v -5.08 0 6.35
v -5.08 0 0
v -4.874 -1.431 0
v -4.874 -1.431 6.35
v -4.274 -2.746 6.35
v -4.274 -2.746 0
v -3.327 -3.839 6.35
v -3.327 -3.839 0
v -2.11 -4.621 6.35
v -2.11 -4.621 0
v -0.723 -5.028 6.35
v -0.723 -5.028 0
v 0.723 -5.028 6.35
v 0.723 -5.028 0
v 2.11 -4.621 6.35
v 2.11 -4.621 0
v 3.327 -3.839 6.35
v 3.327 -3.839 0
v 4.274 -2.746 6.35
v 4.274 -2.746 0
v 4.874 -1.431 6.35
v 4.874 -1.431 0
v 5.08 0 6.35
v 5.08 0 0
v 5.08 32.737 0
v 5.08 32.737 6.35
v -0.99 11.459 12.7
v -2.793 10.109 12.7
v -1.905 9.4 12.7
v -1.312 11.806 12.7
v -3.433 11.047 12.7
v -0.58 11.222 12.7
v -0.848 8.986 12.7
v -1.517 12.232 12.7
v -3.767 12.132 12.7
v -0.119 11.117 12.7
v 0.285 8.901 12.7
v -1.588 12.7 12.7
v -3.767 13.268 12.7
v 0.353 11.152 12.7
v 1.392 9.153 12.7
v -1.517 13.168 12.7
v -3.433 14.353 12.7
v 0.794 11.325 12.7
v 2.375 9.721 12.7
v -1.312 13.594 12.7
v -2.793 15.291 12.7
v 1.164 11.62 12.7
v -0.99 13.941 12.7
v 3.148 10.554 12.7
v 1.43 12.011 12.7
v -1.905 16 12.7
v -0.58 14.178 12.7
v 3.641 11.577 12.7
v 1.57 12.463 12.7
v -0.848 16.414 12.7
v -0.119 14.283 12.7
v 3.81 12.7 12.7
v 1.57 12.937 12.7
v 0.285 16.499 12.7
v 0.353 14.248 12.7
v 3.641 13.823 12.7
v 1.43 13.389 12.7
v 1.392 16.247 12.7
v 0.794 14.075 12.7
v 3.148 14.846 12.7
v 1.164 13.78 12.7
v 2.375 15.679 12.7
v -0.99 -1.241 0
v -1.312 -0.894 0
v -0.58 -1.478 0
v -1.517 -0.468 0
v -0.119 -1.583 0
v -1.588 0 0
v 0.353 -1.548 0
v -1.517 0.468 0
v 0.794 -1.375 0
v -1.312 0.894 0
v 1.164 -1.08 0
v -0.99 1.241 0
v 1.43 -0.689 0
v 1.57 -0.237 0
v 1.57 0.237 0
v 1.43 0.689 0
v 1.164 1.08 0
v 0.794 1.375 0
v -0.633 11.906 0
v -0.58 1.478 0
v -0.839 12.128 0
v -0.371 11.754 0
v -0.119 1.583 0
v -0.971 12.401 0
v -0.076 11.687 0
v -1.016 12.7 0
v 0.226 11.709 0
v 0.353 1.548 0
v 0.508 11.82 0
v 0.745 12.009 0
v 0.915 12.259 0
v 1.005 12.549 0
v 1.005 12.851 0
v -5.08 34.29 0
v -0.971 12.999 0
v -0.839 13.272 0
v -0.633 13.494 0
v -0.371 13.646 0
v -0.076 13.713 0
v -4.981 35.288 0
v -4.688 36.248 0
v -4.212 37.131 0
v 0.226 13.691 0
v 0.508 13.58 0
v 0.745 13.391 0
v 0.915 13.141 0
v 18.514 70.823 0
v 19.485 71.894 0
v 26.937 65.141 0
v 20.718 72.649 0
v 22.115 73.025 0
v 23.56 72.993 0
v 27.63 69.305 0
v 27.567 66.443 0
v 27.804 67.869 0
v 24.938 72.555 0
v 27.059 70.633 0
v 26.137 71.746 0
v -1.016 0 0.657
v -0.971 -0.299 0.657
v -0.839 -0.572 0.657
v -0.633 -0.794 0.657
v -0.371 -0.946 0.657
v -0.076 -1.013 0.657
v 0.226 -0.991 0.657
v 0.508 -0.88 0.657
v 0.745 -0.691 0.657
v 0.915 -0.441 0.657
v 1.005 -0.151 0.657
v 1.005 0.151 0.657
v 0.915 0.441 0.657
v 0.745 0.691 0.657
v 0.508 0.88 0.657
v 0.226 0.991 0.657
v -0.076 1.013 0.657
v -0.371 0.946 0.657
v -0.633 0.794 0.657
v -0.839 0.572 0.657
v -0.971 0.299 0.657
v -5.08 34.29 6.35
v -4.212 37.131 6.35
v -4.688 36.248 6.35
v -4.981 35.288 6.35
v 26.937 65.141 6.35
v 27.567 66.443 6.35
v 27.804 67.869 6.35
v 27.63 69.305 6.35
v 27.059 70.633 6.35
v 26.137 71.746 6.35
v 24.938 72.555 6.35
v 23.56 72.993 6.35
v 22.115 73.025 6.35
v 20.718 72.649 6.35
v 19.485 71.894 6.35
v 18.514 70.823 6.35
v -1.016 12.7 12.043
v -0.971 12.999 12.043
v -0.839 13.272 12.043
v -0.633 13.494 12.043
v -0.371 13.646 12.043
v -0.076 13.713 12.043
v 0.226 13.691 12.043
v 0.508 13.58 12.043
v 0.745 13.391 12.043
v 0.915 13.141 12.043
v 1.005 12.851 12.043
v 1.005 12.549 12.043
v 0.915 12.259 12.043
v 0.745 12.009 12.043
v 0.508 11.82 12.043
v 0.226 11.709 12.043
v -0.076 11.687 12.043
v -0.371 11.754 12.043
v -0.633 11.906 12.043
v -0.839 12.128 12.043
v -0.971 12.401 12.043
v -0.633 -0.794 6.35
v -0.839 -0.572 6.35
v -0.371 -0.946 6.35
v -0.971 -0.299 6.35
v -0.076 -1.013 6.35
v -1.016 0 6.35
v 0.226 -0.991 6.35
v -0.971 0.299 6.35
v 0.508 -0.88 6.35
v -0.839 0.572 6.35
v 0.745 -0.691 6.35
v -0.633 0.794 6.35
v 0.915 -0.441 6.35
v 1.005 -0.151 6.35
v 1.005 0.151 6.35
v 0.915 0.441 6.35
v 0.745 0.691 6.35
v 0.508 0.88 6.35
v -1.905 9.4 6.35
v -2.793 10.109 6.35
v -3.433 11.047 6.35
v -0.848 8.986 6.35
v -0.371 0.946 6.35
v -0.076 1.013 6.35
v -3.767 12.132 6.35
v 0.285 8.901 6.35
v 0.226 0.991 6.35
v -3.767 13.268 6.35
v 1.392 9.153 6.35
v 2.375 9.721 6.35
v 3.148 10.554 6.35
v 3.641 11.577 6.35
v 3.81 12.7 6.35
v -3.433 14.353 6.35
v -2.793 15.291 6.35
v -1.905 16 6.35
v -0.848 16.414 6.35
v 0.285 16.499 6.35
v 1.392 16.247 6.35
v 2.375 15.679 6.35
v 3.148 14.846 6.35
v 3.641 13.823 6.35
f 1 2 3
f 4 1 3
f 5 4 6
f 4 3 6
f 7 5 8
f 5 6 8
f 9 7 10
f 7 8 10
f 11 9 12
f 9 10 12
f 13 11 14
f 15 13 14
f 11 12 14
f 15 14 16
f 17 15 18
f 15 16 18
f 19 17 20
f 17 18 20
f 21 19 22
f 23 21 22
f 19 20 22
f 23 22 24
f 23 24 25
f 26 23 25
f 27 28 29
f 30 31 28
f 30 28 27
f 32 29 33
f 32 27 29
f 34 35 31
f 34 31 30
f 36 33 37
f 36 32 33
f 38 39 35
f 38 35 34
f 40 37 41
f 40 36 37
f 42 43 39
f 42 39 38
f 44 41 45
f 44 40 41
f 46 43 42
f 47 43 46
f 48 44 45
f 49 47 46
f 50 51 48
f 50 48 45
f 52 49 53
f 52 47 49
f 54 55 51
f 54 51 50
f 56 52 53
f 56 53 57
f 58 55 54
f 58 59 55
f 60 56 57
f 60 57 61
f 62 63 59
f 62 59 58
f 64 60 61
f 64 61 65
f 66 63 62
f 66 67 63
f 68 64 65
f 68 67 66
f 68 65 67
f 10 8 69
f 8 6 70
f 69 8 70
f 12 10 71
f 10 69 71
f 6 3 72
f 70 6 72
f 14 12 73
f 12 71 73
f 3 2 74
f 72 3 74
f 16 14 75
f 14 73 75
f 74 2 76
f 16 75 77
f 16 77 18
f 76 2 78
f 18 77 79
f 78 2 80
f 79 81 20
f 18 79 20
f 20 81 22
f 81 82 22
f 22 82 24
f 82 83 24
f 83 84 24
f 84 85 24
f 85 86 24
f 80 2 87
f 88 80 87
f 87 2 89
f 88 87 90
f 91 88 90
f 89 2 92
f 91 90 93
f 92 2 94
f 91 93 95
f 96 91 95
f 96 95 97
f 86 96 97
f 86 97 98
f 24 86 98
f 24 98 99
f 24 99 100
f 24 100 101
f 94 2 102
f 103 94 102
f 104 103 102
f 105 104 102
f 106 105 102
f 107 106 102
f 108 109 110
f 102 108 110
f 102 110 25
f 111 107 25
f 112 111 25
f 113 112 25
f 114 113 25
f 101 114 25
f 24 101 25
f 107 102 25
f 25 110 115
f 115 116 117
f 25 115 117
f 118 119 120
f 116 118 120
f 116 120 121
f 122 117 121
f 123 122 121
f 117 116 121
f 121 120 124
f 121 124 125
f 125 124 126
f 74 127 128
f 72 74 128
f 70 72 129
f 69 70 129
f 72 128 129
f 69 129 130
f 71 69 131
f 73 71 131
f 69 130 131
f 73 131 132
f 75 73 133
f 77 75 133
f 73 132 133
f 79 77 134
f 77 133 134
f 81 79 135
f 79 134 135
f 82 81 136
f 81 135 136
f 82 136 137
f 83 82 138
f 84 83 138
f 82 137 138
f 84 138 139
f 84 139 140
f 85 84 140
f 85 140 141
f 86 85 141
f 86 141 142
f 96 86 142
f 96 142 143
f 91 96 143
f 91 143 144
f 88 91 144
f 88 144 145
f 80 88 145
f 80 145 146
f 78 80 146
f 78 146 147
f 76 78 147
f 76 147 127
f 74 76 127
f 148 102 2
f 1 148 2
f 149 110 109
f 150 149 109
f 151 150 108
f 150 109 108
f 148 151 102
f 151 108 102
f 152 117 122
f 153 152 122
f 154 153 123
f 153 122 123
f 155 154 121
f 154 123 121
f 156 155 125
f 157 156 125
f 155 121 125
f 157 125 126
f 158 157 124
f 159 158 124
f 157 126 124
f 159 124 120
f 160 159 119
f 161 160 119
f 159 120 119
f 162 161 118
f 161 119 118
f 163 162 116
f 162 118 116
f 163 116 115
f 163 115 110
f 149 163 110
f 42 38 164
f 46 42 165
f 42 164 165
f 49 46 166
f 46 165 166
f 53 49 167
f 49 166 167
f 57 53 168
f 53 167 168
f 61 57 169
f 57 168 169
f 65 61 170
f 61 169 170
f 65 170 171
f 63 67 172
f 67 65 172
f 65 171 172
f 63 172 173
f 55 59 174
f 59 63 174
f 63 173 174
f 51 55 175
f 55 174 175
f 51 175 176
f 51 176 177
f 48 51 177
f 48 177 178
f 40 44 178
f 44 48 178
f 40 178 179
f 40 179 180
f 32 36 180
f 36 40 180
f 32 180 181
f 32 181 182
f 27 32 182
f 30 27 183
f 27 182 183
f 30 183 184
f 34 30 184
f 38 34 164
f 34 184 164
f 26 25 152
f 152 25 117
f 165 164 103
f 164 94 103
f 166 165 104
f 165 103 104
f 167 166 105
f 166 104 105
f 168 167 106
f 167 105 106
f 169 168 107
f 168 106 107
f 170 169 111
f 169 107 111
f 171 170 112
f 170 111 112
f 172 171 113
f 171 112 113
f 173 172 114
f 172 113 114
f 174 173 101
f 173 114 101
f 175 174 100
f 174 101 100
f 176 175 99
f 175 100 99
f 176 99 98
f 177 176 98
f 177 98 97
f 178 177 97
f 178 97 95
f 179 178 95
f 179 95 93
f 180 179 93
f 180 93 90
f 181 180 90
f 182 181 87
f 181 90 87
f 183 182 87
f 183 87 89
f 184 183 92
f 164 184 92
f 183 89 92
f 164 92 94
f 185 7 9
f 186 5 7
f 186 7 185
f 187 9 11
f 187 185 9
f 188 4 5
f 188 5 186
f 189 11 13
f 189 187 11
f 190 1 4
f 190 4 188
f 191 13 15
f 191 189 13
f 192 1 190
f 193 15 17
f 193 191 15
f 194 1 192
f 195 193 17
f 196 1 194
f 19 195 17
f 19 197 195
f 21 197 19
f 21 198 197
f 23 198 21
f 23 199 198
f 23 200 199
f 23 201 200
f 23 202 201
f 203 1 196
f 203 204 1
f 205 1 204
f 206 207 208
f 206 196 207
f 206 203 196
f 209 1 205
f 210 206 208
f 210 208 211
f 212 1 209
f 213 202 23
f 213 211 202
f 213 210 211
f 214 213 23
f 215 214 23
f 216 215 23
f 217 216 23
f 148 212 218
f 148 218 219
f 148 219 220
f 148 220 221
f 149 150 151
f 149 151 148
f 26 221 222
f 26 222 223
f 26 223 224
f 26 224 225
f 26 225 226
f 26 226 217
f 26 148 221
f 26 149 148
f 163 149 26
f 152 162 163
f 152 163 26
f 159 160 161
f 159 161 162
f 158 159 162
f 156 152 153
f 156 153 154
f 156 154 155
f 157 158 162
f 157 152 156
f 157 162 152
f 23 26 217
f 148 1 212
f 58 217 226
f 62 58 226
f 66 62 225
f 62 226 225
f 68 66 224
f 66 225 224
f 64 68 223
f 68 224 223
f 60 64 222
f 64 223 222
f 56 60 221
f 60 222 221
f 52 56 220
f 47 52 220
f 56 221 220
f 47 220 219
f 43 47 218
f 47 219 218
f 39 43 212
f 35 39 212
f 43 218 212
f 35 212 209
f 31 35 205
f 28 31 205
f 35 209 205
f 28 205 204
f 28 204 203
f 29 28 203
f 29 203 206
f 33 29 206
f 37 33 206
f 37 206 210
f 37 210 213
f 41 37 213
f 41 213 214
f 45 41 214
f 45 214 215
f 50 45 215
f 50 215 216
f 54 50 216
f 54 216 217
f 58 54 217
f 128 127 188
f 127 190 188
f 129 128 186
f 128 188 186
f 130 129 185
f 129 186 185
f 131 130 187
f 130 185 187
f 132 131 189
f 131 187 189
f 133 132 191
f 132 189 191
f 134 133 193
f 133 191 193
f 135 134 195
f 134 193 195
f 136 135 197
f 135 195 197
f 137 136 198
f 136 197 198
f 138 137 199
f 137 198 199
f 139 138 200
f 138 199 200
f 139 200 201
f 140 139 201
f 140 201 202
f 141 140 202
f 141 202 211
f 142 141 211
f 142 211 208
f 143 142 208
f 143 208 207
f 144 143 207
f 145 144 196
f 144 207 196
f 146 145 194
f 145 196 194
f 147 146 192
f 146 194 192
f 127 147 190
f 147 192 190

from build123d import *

# Parameters (mm, degrees)
F1_DEPTH       = 6.35
F2_R           = 3.81
F3_DEPTH       = 12.7
F5_D           = 2.032
F5_CSINK_D     = 3.175
F5_CSINK_ANGLE = 82
F6_D           = 2.032
F6_CSINK_D     = 3.175
F6_CSINK_ANGLE = 82


with BuildPart() as f1:
    # F0 (on Top) → F1 (new body)
    with BuildSketch(Plane.XY):
        with BuildLine():
            ThreePointArc((-5.08, 12.7), (-3.5921024484, 9.1078975516), (0, 7.62))
            Line((0, 7.62), (0, 12.7))
            Line((0, 12.7), (0, 17.78))
            ThreePointArc((0, 17.78), (-3.5921024484, 16.2921024484), (-5.08, 12.7))
        make_face()
        with BuildLine():
            Line((0, 12.7), (0, 7.62))
            ThreePointArc((0, 7.62), (3.5921024484, 9.1078975516), (5.08, 12.7))
            ThreePointArc((5.08, 12.7), (3.5921024484, 16.2921024484), (0, 17.78))
            Line((0, 17.78), (0, 12.7))
        make_face()
        with BuildLine():
            ThreePointArc((5.08, 12.7), (3.5921024484, 9.1078975516), (0, 7.62))
            ThreePointArc((0, 7.62), (-3.5921024484, 9.1078975516), (-5.08, 12.7))
            Line((-5.08, 12.7), (-5.08, 0))
            ThreePointArc((-5.08, 0), (0, -5.08), (5.08, 0))
            Line((5.08, 0), (5.08, 12.7))
        make_face()
        with BuildLine():
            ThreePointArc((0, 17.78), (3.5921024484, 16.2921024484), (5.08, 12.7))
            Line((5.08, 12.7), (5.08, 32.7368881382))
            Line((5.08, 32.7368881382), (4.2115108686, 31.4493000504))
            ThreePointArc((4.2115108686, 31.4493000504), (2.384915539, 29.8046262283), (0, 29.21))
            Line((0, 29.21), (0, 17.78))
        make_face()
        with BuildLine():
            Line((-5.08, 34.29), (-5.08, 12.7))
            ThreePointArc((-5.08, 12.7), (-3.5921024484, 16.2921024484), (0, 17.78))
            Line((0, 17.78), (0, 29.21))
            ThreePointArc((0, 29.21), (-3.5921024484, 30.6978975516), (-5.08, 34.29))
        make_face()
        with BuildLine():
            Line((5.08, 34.29), (5.08, 32.7368881382))
            Line((5.08, 32.7368881382), (26.9371104656, 65.141386999))
            ThreePointArc((26.9371104656, 65.141386999), (25.5662995467, 72.1935978172), (18.5140887285, 70.8227868983))
            Line((18.5140887285, 70.8227868983), (-4.2115108686, 37.1306999496))
            ThreePointArc((-4.2115108686, 37.1306999496), (-0.9693096965, 39.2766660919), (2.8406999496, 38.5015108686))
            ThreePointArc((2.8406999496, 38.5015108686), (4.4853737717, 36.674915539), (5.08, 34.29))
        make_face()
        with BuildLine():
            Line((4.2115108686, 31.4493000504), (5.08, 32.7368881382))
            Line((5.08, 32.7368881382), (5.08, 34.29))
            ThreePointArc((5.08, 34.29), (4.4853737717, 36.674915539), (2.8406999496, 38.5015108686))
            Line((2.8406999496, 38.5015108686), (0, 34.29))
            Line((0, 34.29), (0, 29.21))
            ThreePointArc((0, 29.21), (2.384915539, 29.8046262283), (4.2115108686, 31.4493000504))
        make_face()
        with BuildLine():
            ThreePointArc((-4.2115108686, 37.1306999496), (-4.8580281603, 35.77524826), (-5.08, 34.29))
            ThreePointArc((-5.08, 34.29), (-3.5921024484, 30.6978975516), (0, 29.21))
            Line((0, 29.21), (0, 34.29))
            Line((0, 34.29), (2.8406999496, 38.5015108686))
            ThreePointArc((2.8406999496, 38.5015108686), (-0.9693096965, 39.2766660919), (-4.2115108686, 37.1306999496))
        make_face()
    extrude(amount=F1_DEPTH)

    # F2 (on Top) → F3 (join)
    with BuildSketch(Plane.XY):
        with Locations((0, 12.7)):
            Circle(F2_R)
    extrude(amount=F3_DEPTH)

    # F5 (through all)
    with Locations(Plane.XY.offset(12.7)):
        with Locations((0, 12.7)):
            CounterSinkHole(F5_D / 2, F5_CSINK_D / 2, counter_sink_angle=F5_CSINK_ANGLE)

    # F6 (through all)
    with Locations(Plane(origin=(0, 0, 0), x_dir=(1, 0, 0), z_dir=(0, 0, -1))):
        with Locations((0, 0)):
            CounterSinkHole(F6_D / 2, F6_CSINK_D / 2, counter_sink_angle=F6_CSINK_ANGLE)


solid = f1.part
